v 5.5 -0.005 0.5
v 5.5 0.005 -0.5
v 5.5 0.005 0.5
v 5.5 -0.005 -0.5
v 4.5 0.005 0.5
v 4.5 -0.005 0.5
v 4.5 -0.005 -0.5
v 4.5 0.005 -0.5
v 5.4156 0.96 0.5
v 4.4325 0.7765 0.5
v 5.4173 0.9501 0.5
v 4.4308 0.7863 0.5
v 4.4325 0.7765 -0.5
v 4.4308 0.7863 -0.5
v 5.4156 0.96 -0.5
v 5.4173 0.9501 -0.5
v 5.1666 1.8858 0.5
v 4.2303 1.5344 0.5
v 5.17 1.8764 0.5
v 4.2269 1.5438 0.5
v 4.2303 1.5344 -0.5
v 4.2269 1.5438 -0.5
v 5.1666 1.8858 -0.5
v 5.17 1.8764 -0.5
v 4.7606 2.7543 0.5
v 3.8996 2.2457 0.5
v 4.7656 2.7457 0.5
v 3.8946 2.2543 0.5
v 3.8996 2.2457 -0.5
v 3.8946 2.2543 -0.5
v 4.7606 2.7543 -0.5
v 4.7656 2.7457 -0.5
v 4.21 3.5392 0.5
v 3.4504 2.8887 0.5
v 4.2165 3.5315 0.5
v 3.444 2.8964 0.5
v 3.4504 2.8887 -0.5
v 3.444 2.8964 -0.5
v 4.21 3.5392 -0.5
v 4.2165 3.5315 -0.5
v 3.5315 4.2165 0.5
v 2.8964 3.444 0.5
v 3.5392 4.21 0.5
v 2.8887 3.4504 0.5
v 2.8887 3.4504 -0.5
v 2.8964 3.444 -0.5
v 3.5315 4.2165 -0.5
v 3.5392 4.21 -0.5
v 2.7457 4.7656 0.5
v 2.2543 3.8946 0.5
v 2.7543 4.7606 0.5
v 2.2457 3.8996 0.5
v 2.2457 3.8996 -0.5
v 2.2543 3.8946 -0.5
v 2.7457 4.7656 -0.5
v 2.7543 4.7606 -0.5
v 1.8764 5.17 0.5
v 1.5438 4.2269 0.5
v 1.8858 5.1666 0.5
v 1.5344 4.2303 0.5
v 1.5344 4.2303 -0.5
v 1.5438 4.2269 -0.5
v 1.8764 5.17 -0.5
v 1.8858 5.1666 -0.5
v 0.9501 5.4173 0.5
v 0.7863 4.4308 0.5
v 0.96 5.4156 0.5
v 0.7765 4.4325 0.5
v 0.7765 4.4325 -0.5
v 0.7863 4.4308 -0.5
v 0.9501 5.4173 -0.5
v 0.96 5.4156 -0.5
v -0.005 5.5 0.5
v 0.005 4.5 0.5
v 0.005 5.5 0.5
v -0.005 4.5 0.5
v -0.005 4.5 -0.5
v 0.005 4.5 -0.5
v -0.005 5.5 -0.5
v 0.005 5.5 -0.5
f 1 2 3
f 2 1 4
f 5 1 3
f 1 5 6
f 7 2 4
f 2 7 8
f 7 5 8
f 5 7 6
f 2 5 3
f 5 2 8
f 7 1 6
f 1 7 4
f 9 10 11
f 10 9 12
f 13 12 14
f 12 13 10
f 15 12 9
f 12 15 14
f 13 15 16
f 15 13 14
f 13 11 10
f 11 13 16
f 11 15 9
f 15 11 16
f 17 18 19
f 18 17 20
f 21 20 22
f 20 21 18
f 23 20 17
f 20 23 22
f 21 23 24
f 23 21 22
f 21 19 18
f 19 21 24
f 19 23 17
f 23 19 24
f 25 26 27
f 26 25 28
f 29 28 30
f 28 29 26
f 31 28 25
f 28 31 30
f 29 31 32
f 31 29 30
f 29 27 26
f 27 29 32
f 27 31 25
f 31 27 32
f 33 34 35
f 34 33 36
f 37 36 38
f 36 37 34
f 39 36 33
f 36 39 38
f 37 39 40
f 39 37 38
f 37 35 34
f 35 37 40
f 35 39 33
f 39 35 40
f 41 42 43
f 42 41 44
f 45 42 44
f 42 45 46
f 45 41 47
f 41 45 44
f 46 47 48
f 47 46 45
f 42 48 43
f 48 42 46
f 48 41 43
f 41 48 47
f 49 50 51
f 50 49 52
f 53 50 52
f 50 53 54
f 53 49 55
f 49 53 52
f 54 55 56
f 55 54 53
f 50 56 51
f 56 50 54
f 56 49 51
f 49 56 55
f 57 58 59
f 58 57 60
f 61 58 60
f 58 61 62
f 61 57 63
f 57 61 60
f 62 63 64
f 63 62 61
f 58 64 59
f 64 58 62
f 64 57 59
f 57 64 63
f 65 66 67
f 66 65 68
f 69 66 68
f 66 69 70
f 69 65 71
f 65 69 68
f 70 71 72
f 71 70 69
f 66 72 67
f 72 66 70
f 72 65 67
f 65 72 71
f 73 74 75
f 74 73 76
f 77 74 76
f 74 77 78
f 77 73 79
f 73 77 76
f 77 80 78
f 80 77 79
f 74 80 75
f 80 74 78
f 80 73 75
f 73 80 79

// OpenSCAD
module shape3D(size, position, center=true) {
    translate(position) cube(size, center=center);
}

size1 = [1, 0.01, 1];
pos1 = [5, 0, 0];

angle_total = 90;
angle_increment = 10;
n_seg = angle_total / angle_increment;
echo("n_seg", n_seg);

// shape3D(size1, pos1);

for (i = [0:1:n_seg]) {
    color("red") rotate(a=i*angle_increment, v=[0,0,1]) shape3D(size1, pos1);
}

echo(norm([1, 1, 1]));

// // Below: play with rotate() operation
// // Manual example:
// // https://en.wikibooks.org/wiki/OpenSCAD_User_Manual/Transformations#rotate
// x= 5; y = 10; z = 10; // point coordinates of end of cylinder
 
// length = norm([x,y,z]);  // radial distance
// b = acos(z/length); // inclination angle
// c = atan2(y,x);     // azimuthal angle

// rotate([0, b, c]) 
//     cylinder(h=length, r=0.5, $fn=50);
// %cube([x,y,z]); // corner of cube should coincide with end of cylinder

// translate([0, 20, 0]) {
//     // color("red")
//     rotate([0, b, 0]) rotate([0, 0, c])
//     // rotate([0, b, c])
//         cylinder(h=length, r=0.5, $fn=50);
//     %cube([x,y,z]); // corner of cube should coincide with end of cylinder
// }
